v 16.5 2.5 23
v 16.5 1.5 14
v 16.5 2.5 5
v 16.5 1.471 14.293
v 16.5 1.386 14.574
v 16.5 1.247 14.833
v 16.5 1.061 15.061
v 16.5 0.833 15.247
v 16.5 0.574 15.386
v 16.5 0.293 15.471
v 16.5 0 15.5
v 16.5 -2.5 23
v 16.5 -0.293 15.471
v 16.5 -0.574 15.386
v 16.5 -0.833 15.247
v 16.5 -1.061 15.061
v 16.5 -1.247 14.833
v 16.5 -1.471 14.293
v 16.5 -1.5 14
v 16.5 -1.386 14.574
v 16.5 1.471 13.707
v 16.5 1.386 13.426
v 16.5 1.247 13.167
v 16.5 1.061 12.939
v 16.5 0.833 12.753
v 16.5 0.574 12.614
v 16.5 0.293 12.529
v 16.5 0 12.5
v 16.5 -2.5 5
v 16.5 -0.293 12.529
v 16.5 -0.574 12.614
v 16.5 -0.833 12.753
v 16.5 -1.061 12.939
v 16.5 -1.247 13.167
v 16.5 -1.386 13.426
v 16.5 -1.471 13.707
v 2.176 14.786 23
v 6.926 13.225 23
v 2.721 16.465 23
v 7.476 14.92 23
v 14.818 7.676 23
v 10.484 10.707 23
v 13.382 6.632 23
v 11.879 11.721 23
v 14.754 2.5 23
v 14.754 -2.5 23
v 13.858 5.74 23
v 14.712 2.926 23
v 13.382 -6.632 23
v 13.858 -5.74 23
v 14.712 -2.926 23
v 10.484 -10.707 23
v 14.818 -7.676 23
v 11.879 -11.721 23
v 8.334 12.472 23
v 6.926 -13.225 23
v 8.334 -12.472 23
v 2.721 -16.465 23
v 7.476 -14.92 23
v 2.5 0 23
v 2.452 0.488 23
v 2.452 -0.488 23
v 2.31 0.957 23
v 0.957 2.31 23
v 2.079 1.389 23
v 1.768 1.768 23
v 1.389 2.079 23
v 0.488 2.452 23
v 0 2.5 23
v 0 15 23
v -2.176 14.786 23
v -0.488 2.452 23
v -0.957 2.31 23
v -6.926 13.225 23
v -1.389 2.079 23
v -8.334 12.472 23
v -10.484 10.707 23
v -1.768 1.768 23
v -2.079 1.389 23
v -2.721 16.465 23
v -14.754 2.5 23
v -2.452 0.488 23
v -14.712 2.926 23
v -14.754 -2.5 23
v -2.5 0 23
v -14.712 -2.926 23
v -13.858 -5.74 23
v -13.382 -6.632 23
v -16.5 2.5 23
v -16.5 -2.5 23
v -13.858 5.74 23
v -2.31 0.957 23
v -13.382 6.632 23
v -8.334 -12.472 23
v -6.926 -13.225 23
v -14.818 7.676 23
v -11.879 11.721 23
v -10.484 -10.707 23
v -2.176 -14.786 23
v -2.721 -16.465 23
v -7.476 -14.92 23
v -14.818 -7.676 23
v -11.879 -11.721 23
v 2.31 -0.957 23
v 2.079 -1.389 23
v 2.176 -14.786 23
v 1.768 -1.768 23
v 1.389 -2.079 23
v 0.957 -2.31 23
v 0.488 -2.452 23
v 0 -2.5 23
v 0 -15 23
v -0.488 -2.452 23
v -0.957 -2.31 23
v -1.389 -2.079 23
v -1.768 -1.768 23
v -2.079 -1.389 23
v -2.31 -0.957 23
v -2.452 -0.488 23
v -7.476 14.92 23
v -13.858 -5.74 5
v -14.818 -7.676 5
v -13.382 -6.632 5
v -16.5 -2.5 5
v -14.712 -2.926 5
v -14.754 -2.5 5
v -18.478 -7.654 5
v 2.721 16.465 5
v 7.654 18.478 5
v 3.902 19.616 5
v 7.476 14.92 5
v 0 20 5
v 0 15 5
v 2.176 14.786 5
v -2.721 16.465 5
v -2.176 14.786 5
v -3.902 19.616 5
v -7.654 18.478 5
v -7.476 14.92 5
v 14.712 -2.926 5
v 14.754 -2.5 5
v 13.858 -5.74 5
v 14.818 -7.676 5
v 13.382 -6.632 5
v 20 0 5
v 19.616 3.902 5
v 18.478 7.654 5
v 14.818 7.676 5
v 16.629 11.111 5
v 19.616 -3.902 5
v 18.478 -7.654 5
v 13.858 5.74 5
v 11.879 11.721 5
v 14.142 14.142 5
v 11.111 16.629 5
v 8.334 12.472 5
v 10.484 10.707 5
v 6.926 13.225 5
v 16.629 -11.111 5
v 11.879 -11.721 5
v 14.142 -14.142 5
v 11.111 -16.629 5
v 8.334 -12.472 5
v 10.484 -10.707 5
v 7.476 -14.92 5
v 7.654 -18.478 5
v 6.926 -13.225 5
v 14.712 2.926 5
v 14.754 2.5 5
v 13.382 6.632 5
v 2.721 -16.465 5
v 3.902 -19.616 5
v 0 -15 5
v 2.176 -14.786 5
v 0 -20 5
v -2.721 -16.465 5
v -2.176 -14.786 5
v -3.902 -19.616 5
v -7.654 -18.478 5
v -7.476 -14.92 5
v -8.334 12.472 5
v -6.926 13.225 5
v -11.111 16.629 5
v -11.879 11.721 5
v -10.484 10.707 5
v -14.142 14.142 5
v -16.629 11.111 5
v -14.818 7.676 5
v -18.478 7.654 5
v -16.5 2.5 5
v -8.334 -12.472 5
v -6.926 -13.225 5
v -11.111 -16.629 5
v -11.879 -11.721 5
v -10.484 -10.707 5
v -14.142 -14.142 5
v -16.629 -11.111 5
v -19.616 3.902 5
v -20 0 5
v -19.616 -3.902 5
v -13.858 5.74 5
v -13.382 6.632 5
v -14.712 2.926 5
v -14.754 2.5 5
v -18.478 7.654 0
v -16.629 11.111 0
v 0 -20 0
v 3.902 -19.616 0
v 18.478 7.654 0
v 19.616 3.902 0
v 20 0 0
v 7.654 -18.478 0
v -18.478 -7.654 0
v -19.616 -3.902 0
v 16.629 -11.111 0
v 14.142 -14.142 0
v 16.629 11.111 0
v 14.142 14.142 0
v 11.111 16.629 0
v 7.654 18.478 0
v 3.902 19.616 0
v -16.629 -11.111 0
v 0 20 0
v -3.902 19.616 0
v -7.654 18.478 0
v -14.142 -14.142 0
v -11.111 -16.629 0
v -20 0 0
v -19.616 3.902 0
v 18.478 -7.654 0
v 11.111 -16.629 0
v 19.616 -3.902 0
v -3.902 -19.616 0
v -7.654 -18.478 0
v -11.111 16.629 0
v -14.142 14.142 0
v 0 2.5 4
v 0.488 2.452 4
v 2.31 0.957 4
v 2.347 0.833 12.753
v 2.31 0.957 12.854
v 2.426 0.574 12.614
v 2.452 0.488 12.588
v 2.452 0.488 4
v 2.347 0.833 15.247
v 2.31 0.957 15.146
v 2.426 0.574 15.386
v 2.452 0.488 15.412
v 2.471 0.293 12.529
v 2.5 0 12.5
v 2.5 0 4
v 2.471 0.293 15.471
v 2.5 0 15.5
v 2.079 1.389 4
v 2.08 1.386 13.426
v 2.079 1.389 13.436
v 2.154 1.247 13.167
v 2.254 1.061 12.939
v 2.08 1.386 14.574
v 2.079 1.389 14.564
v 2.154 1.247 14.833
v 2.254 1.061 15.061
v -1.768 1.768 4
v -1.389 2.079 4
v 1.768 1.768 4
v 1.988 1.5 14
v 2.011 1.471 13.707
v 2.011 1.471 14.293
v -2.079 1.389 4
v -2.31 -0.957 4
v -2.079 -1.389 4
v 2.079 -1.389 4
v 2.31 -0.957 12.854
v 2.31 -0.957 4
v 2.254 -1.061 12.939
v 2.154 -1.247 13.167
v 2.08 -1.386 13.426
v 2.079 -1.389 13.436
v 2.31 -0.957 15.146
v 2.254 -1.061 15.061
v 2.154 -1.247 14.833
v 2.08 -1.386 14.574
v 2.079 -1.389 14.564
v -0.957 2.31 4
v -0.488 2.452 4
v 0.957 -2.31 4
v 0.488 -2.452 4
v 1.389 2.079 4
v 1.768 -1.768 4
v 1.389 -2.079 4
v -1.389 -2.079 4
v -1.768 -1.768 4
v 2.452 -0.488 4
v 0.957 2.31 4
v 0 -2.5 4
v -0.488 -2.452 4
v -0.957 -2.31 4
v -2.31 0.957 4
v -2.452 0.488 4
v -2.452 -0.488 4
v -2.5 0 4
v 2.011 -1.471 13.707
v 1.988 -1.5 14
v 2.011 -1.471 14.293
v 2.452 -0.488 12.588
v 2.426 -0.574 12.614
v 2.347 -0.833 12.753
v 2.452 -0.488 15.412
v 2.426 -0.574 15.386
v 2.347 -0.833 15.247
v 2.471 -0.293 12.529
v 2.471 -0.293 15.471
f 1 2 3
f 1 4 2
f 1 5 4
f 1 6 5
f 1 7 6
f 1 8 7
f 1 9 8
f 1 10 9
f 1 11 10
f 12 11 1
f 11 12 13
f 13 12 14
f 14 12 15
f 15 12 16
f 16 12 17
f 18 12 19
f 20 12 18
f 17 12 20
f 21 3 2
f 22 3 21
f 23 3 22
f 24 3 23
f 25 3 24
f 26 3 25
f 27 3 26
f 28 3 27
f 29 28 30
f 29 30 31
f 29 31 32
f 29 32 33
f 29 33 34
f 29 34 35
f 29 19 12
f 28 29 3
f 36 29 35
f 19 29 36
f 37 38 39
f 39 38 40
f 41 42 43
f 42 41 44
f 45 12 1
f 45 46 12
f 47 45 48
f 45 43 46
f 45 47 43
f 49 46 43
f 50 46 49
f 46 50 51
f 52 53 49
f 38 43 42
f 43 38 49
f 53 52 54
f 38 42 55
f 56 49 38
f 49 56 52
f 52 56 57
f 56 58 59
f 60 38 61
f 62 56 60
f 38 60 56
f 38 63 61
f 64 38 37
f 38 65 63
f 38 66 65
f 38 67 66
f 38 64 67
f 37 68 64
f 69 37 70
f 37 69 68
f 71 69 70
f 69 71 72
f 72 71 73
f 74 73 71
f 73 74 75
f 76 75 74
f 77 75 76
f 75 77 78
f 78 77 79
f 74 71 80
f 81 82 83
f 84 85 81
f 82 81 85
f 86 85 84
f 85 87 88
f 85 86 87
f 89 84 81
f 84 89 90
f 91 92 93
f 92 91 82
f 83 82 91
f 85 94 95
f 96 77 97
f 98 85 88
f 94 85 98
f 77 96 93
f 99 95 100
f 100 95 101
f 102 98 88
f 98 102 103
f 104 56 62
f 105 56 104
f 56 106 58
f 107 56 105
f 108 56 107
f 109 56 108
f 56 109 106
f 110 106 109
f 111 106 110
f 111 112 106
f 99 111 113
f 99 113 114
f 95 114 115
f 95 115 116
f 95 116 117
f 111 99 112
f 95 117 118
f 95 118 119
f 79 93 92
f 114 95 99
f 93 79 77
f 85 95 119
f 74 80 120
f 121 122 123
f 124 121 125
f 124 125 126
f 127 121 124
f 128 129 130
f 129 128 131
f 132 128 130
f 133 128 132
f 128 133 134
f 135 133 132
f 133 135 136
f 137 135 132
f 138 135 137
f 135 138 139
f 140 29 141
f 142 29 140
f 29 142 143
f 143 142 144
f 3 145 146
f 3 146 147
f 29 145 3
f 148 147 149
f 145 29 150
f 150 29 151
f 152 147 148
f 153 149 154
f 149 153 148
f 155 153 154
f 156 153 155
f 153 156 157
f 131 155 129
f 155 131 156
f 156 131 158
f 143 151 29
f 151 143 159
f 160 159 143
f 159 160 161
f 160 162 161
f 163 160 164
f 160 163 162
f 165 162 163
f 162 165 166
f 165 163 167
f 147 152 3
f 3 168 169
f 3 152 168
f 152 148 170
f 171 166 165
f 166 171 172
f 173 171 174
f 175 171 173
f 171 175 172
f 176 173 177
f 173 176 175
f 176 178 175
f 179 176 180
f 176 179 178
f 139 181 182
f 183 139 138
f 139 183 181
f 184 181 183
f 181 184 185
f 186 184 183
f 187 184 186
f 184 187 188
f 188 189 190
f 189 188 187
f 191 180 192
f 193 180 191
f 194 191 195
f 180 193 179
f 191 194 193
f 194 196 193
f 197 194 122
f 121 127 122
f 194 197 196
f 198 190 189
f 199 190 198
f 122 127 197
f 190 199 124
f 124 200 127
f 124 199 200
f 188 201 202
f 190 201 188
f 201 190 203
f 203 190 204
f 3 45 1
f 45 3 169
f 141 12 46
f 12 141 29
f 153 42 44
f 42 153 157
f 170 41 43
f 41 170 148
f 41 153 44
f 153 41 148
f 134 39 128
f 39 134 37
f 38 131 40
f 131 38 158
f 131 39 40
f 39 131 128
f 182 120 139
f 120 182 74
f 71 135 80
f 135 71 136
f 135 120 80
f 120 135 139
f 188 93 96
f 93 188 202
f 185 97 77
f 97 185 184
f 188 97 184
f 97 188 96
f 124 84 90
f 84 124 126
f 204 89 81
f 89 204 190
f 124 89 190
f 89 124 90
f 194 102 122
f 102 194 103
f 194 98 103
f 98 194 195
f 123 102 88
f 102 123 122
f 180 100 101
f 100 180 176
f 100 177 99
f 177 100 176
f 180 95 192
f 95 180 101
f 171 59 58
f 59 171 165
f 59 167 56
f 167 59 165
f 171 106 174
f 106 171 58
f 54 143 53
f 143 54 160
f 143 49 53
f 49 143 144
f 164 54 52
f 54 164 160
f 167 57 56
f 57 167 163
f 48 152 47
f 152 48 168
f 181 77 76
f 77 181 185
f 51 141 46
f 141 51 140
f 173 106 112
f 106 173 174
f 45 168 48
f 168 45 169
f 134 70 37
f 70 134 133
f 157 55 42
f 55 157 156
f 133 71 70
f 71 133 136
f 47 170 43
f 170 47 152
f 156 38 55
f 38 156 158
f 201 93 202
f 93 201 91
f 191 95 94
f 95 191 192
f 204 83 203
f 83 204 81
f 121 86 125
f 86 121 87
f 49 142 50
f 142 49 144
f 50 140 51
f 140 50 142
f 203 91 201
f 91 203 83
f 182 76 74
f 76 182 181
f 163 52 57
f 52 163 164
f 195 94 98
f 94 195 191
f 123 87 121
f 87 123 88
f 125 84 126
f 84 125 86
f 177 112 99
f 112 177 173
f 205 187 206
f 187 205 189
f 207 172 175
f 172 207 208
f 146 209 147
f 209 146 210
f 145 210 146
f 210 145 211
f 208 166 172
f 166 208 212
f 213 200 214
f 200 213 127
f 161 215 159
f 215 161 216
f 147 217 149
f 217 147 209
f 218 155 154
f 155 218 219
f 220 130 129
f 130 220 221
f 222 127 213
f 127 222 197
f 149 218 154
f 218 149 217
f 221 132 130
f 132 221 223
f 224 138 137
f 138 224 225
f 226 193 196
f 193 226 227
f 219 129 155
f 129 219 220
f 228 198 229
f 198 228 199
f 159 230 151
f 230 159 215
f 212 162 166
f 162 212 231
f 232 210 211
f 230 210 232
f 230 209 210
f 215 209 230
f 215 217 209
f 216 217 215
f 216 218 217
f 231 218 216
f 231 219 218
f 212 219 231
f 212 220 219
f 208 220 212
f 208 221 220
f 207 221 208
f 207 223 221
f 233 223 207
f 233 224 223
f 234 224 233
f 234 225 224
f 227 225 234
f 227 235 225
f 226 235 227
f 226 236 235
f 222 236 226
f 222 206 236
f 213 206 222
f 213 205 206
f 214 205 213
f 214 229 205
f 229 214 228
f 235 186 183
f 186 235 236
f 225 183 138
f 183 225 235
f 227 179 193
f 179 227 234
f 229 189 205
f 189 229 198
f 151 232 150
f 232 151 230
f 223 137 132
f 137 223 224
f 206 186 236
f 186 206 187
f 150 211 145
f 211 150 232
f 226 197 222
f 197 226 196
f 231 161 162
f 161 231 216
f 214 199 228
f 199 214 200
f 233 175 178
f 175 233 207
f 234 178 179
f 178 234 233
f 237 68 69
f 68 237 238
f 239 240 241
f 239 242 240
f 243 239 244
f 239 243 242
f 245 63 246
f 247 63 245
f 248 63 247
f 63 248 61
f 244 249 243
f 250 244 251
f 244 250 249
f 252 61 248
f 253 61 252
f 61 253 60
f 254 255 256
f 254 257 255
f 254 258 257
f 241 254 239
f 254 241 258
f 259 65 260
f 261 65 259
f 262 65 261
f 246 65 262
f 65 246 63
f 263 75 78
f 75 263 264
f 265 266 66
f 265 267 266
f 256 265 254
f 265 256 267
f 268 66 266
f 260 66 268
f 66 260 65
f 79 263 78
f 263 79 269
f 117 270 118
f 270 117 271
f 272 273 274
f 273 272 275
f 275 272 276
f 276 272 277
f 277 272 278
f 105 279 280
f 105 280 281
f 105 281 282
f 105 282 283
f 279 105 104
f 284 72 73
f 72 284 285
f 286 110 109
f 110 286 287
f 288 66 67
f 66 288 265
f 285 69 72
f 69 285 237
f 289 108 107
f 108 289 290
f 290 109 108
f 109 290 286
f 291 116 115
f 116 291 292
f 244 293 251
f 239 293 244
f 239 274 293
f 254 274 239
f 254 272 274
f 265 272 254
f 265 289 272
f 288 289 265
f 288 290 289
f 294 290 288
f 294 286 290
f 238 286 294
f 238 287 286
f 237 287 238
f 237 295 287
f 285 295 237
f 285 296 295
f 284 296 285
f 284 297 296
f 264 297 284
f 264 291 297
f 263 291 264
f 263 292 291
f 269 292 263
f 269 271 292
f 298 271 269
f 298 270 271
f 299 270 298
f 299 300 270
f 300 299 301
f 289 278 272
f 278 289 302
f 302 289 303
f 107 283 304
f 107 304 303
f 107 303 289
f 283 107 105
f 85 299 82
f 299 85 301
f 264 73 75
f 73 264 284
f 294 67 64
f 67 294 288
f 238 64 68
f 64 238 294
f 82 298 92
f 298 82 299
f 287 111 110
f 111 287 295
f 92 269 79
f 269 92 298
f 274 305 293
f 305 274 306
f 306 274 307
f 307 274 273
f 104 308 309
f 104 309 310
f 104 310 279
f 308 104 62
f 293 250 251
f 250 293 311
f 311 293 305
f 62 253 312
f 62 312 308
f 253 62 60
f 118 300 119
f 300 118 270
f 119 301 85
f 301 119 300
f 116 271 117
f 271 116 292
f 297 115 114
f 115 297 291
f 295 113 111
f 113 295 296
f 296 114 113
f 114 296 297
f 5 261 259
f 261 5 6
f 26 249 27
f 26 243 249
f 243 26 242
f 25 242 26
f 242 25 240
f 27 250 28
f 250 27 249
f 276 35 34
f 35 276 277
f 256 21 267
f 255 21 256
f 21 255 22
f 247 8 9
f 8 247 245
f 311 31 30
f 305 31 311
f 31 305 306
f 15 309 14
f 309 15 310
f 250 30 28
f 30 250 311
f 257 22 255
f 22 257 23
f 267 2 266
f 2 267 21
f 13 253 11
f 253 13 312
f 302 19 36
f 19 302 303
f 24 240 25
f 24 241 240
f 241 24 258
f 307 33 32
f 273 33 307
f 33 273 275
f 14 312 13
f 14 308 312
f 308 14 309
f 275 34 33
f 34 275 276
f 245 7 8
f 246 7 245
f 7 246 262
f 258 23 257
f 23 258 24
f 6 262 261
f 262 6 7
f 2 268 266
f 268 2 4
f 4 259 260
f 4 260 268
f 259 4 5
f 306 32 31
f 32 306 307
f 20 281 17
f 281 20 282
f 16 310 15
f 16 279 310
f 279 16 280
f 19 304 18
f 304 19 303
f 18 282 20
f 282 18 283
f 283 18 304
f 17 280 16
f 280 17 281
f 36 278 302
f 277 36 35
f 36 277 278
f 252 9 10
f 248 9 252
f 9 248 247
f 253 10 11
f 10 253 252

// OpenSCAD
$fn = 32;

// ----------------------------------------------------------------------
// Control knob: skirt knob with grip ribs
// ----------------------------------------------------------------------

// --- parameters (mm) ---
skirt_d = 40;             // skirt diameter
skirt_t = 5;              // skirt thickness
rib_w = 5;                // grip rib width
rib_out = 2.5;            // grip rib radial protrusion
n_ribs = 10;              // number of grip ribs
knob_d = 30;              // knob body diameter
knob_h = 18;              // knob body height
bore_d = 5;               // shaft bore diameter
set_d = 3;                // set screw bore diameter
fit_tol = 0.1;            // tolerance for press fits, mm
free_tol = 0.3;           // tolerance for clearance fits, mm

rib_step = 360 / n_ribs;  // rib angular step
total_h = skirt_t + knob_h;  // overall height

difference() {
  union() {
    translate([0, 0, skirt_t]) cylinder(h = knob_h, d = knob_d);
    cylinder(h = skirt_t, d = skirt_d);
    for (i = [0 : n_ribs - 1])
      rotate([0, 0, i * rib_step])
        translate([knob_d / 2 - 1, -rib_w / 2, skirt_t])
          cube([rib_out, rib_w, knob_h]);
  }
  translate([0, 0, skirt_t - 1]) cylinder(h = knob_h + 2, d = bore_d);
  translate([-1, 0, skirt_t + knob_h / 2]) rotate([0, 90, 0])
    cylinder(h = knob_d / 2 + bore_d / 2 + 2, d = set_d);
}
